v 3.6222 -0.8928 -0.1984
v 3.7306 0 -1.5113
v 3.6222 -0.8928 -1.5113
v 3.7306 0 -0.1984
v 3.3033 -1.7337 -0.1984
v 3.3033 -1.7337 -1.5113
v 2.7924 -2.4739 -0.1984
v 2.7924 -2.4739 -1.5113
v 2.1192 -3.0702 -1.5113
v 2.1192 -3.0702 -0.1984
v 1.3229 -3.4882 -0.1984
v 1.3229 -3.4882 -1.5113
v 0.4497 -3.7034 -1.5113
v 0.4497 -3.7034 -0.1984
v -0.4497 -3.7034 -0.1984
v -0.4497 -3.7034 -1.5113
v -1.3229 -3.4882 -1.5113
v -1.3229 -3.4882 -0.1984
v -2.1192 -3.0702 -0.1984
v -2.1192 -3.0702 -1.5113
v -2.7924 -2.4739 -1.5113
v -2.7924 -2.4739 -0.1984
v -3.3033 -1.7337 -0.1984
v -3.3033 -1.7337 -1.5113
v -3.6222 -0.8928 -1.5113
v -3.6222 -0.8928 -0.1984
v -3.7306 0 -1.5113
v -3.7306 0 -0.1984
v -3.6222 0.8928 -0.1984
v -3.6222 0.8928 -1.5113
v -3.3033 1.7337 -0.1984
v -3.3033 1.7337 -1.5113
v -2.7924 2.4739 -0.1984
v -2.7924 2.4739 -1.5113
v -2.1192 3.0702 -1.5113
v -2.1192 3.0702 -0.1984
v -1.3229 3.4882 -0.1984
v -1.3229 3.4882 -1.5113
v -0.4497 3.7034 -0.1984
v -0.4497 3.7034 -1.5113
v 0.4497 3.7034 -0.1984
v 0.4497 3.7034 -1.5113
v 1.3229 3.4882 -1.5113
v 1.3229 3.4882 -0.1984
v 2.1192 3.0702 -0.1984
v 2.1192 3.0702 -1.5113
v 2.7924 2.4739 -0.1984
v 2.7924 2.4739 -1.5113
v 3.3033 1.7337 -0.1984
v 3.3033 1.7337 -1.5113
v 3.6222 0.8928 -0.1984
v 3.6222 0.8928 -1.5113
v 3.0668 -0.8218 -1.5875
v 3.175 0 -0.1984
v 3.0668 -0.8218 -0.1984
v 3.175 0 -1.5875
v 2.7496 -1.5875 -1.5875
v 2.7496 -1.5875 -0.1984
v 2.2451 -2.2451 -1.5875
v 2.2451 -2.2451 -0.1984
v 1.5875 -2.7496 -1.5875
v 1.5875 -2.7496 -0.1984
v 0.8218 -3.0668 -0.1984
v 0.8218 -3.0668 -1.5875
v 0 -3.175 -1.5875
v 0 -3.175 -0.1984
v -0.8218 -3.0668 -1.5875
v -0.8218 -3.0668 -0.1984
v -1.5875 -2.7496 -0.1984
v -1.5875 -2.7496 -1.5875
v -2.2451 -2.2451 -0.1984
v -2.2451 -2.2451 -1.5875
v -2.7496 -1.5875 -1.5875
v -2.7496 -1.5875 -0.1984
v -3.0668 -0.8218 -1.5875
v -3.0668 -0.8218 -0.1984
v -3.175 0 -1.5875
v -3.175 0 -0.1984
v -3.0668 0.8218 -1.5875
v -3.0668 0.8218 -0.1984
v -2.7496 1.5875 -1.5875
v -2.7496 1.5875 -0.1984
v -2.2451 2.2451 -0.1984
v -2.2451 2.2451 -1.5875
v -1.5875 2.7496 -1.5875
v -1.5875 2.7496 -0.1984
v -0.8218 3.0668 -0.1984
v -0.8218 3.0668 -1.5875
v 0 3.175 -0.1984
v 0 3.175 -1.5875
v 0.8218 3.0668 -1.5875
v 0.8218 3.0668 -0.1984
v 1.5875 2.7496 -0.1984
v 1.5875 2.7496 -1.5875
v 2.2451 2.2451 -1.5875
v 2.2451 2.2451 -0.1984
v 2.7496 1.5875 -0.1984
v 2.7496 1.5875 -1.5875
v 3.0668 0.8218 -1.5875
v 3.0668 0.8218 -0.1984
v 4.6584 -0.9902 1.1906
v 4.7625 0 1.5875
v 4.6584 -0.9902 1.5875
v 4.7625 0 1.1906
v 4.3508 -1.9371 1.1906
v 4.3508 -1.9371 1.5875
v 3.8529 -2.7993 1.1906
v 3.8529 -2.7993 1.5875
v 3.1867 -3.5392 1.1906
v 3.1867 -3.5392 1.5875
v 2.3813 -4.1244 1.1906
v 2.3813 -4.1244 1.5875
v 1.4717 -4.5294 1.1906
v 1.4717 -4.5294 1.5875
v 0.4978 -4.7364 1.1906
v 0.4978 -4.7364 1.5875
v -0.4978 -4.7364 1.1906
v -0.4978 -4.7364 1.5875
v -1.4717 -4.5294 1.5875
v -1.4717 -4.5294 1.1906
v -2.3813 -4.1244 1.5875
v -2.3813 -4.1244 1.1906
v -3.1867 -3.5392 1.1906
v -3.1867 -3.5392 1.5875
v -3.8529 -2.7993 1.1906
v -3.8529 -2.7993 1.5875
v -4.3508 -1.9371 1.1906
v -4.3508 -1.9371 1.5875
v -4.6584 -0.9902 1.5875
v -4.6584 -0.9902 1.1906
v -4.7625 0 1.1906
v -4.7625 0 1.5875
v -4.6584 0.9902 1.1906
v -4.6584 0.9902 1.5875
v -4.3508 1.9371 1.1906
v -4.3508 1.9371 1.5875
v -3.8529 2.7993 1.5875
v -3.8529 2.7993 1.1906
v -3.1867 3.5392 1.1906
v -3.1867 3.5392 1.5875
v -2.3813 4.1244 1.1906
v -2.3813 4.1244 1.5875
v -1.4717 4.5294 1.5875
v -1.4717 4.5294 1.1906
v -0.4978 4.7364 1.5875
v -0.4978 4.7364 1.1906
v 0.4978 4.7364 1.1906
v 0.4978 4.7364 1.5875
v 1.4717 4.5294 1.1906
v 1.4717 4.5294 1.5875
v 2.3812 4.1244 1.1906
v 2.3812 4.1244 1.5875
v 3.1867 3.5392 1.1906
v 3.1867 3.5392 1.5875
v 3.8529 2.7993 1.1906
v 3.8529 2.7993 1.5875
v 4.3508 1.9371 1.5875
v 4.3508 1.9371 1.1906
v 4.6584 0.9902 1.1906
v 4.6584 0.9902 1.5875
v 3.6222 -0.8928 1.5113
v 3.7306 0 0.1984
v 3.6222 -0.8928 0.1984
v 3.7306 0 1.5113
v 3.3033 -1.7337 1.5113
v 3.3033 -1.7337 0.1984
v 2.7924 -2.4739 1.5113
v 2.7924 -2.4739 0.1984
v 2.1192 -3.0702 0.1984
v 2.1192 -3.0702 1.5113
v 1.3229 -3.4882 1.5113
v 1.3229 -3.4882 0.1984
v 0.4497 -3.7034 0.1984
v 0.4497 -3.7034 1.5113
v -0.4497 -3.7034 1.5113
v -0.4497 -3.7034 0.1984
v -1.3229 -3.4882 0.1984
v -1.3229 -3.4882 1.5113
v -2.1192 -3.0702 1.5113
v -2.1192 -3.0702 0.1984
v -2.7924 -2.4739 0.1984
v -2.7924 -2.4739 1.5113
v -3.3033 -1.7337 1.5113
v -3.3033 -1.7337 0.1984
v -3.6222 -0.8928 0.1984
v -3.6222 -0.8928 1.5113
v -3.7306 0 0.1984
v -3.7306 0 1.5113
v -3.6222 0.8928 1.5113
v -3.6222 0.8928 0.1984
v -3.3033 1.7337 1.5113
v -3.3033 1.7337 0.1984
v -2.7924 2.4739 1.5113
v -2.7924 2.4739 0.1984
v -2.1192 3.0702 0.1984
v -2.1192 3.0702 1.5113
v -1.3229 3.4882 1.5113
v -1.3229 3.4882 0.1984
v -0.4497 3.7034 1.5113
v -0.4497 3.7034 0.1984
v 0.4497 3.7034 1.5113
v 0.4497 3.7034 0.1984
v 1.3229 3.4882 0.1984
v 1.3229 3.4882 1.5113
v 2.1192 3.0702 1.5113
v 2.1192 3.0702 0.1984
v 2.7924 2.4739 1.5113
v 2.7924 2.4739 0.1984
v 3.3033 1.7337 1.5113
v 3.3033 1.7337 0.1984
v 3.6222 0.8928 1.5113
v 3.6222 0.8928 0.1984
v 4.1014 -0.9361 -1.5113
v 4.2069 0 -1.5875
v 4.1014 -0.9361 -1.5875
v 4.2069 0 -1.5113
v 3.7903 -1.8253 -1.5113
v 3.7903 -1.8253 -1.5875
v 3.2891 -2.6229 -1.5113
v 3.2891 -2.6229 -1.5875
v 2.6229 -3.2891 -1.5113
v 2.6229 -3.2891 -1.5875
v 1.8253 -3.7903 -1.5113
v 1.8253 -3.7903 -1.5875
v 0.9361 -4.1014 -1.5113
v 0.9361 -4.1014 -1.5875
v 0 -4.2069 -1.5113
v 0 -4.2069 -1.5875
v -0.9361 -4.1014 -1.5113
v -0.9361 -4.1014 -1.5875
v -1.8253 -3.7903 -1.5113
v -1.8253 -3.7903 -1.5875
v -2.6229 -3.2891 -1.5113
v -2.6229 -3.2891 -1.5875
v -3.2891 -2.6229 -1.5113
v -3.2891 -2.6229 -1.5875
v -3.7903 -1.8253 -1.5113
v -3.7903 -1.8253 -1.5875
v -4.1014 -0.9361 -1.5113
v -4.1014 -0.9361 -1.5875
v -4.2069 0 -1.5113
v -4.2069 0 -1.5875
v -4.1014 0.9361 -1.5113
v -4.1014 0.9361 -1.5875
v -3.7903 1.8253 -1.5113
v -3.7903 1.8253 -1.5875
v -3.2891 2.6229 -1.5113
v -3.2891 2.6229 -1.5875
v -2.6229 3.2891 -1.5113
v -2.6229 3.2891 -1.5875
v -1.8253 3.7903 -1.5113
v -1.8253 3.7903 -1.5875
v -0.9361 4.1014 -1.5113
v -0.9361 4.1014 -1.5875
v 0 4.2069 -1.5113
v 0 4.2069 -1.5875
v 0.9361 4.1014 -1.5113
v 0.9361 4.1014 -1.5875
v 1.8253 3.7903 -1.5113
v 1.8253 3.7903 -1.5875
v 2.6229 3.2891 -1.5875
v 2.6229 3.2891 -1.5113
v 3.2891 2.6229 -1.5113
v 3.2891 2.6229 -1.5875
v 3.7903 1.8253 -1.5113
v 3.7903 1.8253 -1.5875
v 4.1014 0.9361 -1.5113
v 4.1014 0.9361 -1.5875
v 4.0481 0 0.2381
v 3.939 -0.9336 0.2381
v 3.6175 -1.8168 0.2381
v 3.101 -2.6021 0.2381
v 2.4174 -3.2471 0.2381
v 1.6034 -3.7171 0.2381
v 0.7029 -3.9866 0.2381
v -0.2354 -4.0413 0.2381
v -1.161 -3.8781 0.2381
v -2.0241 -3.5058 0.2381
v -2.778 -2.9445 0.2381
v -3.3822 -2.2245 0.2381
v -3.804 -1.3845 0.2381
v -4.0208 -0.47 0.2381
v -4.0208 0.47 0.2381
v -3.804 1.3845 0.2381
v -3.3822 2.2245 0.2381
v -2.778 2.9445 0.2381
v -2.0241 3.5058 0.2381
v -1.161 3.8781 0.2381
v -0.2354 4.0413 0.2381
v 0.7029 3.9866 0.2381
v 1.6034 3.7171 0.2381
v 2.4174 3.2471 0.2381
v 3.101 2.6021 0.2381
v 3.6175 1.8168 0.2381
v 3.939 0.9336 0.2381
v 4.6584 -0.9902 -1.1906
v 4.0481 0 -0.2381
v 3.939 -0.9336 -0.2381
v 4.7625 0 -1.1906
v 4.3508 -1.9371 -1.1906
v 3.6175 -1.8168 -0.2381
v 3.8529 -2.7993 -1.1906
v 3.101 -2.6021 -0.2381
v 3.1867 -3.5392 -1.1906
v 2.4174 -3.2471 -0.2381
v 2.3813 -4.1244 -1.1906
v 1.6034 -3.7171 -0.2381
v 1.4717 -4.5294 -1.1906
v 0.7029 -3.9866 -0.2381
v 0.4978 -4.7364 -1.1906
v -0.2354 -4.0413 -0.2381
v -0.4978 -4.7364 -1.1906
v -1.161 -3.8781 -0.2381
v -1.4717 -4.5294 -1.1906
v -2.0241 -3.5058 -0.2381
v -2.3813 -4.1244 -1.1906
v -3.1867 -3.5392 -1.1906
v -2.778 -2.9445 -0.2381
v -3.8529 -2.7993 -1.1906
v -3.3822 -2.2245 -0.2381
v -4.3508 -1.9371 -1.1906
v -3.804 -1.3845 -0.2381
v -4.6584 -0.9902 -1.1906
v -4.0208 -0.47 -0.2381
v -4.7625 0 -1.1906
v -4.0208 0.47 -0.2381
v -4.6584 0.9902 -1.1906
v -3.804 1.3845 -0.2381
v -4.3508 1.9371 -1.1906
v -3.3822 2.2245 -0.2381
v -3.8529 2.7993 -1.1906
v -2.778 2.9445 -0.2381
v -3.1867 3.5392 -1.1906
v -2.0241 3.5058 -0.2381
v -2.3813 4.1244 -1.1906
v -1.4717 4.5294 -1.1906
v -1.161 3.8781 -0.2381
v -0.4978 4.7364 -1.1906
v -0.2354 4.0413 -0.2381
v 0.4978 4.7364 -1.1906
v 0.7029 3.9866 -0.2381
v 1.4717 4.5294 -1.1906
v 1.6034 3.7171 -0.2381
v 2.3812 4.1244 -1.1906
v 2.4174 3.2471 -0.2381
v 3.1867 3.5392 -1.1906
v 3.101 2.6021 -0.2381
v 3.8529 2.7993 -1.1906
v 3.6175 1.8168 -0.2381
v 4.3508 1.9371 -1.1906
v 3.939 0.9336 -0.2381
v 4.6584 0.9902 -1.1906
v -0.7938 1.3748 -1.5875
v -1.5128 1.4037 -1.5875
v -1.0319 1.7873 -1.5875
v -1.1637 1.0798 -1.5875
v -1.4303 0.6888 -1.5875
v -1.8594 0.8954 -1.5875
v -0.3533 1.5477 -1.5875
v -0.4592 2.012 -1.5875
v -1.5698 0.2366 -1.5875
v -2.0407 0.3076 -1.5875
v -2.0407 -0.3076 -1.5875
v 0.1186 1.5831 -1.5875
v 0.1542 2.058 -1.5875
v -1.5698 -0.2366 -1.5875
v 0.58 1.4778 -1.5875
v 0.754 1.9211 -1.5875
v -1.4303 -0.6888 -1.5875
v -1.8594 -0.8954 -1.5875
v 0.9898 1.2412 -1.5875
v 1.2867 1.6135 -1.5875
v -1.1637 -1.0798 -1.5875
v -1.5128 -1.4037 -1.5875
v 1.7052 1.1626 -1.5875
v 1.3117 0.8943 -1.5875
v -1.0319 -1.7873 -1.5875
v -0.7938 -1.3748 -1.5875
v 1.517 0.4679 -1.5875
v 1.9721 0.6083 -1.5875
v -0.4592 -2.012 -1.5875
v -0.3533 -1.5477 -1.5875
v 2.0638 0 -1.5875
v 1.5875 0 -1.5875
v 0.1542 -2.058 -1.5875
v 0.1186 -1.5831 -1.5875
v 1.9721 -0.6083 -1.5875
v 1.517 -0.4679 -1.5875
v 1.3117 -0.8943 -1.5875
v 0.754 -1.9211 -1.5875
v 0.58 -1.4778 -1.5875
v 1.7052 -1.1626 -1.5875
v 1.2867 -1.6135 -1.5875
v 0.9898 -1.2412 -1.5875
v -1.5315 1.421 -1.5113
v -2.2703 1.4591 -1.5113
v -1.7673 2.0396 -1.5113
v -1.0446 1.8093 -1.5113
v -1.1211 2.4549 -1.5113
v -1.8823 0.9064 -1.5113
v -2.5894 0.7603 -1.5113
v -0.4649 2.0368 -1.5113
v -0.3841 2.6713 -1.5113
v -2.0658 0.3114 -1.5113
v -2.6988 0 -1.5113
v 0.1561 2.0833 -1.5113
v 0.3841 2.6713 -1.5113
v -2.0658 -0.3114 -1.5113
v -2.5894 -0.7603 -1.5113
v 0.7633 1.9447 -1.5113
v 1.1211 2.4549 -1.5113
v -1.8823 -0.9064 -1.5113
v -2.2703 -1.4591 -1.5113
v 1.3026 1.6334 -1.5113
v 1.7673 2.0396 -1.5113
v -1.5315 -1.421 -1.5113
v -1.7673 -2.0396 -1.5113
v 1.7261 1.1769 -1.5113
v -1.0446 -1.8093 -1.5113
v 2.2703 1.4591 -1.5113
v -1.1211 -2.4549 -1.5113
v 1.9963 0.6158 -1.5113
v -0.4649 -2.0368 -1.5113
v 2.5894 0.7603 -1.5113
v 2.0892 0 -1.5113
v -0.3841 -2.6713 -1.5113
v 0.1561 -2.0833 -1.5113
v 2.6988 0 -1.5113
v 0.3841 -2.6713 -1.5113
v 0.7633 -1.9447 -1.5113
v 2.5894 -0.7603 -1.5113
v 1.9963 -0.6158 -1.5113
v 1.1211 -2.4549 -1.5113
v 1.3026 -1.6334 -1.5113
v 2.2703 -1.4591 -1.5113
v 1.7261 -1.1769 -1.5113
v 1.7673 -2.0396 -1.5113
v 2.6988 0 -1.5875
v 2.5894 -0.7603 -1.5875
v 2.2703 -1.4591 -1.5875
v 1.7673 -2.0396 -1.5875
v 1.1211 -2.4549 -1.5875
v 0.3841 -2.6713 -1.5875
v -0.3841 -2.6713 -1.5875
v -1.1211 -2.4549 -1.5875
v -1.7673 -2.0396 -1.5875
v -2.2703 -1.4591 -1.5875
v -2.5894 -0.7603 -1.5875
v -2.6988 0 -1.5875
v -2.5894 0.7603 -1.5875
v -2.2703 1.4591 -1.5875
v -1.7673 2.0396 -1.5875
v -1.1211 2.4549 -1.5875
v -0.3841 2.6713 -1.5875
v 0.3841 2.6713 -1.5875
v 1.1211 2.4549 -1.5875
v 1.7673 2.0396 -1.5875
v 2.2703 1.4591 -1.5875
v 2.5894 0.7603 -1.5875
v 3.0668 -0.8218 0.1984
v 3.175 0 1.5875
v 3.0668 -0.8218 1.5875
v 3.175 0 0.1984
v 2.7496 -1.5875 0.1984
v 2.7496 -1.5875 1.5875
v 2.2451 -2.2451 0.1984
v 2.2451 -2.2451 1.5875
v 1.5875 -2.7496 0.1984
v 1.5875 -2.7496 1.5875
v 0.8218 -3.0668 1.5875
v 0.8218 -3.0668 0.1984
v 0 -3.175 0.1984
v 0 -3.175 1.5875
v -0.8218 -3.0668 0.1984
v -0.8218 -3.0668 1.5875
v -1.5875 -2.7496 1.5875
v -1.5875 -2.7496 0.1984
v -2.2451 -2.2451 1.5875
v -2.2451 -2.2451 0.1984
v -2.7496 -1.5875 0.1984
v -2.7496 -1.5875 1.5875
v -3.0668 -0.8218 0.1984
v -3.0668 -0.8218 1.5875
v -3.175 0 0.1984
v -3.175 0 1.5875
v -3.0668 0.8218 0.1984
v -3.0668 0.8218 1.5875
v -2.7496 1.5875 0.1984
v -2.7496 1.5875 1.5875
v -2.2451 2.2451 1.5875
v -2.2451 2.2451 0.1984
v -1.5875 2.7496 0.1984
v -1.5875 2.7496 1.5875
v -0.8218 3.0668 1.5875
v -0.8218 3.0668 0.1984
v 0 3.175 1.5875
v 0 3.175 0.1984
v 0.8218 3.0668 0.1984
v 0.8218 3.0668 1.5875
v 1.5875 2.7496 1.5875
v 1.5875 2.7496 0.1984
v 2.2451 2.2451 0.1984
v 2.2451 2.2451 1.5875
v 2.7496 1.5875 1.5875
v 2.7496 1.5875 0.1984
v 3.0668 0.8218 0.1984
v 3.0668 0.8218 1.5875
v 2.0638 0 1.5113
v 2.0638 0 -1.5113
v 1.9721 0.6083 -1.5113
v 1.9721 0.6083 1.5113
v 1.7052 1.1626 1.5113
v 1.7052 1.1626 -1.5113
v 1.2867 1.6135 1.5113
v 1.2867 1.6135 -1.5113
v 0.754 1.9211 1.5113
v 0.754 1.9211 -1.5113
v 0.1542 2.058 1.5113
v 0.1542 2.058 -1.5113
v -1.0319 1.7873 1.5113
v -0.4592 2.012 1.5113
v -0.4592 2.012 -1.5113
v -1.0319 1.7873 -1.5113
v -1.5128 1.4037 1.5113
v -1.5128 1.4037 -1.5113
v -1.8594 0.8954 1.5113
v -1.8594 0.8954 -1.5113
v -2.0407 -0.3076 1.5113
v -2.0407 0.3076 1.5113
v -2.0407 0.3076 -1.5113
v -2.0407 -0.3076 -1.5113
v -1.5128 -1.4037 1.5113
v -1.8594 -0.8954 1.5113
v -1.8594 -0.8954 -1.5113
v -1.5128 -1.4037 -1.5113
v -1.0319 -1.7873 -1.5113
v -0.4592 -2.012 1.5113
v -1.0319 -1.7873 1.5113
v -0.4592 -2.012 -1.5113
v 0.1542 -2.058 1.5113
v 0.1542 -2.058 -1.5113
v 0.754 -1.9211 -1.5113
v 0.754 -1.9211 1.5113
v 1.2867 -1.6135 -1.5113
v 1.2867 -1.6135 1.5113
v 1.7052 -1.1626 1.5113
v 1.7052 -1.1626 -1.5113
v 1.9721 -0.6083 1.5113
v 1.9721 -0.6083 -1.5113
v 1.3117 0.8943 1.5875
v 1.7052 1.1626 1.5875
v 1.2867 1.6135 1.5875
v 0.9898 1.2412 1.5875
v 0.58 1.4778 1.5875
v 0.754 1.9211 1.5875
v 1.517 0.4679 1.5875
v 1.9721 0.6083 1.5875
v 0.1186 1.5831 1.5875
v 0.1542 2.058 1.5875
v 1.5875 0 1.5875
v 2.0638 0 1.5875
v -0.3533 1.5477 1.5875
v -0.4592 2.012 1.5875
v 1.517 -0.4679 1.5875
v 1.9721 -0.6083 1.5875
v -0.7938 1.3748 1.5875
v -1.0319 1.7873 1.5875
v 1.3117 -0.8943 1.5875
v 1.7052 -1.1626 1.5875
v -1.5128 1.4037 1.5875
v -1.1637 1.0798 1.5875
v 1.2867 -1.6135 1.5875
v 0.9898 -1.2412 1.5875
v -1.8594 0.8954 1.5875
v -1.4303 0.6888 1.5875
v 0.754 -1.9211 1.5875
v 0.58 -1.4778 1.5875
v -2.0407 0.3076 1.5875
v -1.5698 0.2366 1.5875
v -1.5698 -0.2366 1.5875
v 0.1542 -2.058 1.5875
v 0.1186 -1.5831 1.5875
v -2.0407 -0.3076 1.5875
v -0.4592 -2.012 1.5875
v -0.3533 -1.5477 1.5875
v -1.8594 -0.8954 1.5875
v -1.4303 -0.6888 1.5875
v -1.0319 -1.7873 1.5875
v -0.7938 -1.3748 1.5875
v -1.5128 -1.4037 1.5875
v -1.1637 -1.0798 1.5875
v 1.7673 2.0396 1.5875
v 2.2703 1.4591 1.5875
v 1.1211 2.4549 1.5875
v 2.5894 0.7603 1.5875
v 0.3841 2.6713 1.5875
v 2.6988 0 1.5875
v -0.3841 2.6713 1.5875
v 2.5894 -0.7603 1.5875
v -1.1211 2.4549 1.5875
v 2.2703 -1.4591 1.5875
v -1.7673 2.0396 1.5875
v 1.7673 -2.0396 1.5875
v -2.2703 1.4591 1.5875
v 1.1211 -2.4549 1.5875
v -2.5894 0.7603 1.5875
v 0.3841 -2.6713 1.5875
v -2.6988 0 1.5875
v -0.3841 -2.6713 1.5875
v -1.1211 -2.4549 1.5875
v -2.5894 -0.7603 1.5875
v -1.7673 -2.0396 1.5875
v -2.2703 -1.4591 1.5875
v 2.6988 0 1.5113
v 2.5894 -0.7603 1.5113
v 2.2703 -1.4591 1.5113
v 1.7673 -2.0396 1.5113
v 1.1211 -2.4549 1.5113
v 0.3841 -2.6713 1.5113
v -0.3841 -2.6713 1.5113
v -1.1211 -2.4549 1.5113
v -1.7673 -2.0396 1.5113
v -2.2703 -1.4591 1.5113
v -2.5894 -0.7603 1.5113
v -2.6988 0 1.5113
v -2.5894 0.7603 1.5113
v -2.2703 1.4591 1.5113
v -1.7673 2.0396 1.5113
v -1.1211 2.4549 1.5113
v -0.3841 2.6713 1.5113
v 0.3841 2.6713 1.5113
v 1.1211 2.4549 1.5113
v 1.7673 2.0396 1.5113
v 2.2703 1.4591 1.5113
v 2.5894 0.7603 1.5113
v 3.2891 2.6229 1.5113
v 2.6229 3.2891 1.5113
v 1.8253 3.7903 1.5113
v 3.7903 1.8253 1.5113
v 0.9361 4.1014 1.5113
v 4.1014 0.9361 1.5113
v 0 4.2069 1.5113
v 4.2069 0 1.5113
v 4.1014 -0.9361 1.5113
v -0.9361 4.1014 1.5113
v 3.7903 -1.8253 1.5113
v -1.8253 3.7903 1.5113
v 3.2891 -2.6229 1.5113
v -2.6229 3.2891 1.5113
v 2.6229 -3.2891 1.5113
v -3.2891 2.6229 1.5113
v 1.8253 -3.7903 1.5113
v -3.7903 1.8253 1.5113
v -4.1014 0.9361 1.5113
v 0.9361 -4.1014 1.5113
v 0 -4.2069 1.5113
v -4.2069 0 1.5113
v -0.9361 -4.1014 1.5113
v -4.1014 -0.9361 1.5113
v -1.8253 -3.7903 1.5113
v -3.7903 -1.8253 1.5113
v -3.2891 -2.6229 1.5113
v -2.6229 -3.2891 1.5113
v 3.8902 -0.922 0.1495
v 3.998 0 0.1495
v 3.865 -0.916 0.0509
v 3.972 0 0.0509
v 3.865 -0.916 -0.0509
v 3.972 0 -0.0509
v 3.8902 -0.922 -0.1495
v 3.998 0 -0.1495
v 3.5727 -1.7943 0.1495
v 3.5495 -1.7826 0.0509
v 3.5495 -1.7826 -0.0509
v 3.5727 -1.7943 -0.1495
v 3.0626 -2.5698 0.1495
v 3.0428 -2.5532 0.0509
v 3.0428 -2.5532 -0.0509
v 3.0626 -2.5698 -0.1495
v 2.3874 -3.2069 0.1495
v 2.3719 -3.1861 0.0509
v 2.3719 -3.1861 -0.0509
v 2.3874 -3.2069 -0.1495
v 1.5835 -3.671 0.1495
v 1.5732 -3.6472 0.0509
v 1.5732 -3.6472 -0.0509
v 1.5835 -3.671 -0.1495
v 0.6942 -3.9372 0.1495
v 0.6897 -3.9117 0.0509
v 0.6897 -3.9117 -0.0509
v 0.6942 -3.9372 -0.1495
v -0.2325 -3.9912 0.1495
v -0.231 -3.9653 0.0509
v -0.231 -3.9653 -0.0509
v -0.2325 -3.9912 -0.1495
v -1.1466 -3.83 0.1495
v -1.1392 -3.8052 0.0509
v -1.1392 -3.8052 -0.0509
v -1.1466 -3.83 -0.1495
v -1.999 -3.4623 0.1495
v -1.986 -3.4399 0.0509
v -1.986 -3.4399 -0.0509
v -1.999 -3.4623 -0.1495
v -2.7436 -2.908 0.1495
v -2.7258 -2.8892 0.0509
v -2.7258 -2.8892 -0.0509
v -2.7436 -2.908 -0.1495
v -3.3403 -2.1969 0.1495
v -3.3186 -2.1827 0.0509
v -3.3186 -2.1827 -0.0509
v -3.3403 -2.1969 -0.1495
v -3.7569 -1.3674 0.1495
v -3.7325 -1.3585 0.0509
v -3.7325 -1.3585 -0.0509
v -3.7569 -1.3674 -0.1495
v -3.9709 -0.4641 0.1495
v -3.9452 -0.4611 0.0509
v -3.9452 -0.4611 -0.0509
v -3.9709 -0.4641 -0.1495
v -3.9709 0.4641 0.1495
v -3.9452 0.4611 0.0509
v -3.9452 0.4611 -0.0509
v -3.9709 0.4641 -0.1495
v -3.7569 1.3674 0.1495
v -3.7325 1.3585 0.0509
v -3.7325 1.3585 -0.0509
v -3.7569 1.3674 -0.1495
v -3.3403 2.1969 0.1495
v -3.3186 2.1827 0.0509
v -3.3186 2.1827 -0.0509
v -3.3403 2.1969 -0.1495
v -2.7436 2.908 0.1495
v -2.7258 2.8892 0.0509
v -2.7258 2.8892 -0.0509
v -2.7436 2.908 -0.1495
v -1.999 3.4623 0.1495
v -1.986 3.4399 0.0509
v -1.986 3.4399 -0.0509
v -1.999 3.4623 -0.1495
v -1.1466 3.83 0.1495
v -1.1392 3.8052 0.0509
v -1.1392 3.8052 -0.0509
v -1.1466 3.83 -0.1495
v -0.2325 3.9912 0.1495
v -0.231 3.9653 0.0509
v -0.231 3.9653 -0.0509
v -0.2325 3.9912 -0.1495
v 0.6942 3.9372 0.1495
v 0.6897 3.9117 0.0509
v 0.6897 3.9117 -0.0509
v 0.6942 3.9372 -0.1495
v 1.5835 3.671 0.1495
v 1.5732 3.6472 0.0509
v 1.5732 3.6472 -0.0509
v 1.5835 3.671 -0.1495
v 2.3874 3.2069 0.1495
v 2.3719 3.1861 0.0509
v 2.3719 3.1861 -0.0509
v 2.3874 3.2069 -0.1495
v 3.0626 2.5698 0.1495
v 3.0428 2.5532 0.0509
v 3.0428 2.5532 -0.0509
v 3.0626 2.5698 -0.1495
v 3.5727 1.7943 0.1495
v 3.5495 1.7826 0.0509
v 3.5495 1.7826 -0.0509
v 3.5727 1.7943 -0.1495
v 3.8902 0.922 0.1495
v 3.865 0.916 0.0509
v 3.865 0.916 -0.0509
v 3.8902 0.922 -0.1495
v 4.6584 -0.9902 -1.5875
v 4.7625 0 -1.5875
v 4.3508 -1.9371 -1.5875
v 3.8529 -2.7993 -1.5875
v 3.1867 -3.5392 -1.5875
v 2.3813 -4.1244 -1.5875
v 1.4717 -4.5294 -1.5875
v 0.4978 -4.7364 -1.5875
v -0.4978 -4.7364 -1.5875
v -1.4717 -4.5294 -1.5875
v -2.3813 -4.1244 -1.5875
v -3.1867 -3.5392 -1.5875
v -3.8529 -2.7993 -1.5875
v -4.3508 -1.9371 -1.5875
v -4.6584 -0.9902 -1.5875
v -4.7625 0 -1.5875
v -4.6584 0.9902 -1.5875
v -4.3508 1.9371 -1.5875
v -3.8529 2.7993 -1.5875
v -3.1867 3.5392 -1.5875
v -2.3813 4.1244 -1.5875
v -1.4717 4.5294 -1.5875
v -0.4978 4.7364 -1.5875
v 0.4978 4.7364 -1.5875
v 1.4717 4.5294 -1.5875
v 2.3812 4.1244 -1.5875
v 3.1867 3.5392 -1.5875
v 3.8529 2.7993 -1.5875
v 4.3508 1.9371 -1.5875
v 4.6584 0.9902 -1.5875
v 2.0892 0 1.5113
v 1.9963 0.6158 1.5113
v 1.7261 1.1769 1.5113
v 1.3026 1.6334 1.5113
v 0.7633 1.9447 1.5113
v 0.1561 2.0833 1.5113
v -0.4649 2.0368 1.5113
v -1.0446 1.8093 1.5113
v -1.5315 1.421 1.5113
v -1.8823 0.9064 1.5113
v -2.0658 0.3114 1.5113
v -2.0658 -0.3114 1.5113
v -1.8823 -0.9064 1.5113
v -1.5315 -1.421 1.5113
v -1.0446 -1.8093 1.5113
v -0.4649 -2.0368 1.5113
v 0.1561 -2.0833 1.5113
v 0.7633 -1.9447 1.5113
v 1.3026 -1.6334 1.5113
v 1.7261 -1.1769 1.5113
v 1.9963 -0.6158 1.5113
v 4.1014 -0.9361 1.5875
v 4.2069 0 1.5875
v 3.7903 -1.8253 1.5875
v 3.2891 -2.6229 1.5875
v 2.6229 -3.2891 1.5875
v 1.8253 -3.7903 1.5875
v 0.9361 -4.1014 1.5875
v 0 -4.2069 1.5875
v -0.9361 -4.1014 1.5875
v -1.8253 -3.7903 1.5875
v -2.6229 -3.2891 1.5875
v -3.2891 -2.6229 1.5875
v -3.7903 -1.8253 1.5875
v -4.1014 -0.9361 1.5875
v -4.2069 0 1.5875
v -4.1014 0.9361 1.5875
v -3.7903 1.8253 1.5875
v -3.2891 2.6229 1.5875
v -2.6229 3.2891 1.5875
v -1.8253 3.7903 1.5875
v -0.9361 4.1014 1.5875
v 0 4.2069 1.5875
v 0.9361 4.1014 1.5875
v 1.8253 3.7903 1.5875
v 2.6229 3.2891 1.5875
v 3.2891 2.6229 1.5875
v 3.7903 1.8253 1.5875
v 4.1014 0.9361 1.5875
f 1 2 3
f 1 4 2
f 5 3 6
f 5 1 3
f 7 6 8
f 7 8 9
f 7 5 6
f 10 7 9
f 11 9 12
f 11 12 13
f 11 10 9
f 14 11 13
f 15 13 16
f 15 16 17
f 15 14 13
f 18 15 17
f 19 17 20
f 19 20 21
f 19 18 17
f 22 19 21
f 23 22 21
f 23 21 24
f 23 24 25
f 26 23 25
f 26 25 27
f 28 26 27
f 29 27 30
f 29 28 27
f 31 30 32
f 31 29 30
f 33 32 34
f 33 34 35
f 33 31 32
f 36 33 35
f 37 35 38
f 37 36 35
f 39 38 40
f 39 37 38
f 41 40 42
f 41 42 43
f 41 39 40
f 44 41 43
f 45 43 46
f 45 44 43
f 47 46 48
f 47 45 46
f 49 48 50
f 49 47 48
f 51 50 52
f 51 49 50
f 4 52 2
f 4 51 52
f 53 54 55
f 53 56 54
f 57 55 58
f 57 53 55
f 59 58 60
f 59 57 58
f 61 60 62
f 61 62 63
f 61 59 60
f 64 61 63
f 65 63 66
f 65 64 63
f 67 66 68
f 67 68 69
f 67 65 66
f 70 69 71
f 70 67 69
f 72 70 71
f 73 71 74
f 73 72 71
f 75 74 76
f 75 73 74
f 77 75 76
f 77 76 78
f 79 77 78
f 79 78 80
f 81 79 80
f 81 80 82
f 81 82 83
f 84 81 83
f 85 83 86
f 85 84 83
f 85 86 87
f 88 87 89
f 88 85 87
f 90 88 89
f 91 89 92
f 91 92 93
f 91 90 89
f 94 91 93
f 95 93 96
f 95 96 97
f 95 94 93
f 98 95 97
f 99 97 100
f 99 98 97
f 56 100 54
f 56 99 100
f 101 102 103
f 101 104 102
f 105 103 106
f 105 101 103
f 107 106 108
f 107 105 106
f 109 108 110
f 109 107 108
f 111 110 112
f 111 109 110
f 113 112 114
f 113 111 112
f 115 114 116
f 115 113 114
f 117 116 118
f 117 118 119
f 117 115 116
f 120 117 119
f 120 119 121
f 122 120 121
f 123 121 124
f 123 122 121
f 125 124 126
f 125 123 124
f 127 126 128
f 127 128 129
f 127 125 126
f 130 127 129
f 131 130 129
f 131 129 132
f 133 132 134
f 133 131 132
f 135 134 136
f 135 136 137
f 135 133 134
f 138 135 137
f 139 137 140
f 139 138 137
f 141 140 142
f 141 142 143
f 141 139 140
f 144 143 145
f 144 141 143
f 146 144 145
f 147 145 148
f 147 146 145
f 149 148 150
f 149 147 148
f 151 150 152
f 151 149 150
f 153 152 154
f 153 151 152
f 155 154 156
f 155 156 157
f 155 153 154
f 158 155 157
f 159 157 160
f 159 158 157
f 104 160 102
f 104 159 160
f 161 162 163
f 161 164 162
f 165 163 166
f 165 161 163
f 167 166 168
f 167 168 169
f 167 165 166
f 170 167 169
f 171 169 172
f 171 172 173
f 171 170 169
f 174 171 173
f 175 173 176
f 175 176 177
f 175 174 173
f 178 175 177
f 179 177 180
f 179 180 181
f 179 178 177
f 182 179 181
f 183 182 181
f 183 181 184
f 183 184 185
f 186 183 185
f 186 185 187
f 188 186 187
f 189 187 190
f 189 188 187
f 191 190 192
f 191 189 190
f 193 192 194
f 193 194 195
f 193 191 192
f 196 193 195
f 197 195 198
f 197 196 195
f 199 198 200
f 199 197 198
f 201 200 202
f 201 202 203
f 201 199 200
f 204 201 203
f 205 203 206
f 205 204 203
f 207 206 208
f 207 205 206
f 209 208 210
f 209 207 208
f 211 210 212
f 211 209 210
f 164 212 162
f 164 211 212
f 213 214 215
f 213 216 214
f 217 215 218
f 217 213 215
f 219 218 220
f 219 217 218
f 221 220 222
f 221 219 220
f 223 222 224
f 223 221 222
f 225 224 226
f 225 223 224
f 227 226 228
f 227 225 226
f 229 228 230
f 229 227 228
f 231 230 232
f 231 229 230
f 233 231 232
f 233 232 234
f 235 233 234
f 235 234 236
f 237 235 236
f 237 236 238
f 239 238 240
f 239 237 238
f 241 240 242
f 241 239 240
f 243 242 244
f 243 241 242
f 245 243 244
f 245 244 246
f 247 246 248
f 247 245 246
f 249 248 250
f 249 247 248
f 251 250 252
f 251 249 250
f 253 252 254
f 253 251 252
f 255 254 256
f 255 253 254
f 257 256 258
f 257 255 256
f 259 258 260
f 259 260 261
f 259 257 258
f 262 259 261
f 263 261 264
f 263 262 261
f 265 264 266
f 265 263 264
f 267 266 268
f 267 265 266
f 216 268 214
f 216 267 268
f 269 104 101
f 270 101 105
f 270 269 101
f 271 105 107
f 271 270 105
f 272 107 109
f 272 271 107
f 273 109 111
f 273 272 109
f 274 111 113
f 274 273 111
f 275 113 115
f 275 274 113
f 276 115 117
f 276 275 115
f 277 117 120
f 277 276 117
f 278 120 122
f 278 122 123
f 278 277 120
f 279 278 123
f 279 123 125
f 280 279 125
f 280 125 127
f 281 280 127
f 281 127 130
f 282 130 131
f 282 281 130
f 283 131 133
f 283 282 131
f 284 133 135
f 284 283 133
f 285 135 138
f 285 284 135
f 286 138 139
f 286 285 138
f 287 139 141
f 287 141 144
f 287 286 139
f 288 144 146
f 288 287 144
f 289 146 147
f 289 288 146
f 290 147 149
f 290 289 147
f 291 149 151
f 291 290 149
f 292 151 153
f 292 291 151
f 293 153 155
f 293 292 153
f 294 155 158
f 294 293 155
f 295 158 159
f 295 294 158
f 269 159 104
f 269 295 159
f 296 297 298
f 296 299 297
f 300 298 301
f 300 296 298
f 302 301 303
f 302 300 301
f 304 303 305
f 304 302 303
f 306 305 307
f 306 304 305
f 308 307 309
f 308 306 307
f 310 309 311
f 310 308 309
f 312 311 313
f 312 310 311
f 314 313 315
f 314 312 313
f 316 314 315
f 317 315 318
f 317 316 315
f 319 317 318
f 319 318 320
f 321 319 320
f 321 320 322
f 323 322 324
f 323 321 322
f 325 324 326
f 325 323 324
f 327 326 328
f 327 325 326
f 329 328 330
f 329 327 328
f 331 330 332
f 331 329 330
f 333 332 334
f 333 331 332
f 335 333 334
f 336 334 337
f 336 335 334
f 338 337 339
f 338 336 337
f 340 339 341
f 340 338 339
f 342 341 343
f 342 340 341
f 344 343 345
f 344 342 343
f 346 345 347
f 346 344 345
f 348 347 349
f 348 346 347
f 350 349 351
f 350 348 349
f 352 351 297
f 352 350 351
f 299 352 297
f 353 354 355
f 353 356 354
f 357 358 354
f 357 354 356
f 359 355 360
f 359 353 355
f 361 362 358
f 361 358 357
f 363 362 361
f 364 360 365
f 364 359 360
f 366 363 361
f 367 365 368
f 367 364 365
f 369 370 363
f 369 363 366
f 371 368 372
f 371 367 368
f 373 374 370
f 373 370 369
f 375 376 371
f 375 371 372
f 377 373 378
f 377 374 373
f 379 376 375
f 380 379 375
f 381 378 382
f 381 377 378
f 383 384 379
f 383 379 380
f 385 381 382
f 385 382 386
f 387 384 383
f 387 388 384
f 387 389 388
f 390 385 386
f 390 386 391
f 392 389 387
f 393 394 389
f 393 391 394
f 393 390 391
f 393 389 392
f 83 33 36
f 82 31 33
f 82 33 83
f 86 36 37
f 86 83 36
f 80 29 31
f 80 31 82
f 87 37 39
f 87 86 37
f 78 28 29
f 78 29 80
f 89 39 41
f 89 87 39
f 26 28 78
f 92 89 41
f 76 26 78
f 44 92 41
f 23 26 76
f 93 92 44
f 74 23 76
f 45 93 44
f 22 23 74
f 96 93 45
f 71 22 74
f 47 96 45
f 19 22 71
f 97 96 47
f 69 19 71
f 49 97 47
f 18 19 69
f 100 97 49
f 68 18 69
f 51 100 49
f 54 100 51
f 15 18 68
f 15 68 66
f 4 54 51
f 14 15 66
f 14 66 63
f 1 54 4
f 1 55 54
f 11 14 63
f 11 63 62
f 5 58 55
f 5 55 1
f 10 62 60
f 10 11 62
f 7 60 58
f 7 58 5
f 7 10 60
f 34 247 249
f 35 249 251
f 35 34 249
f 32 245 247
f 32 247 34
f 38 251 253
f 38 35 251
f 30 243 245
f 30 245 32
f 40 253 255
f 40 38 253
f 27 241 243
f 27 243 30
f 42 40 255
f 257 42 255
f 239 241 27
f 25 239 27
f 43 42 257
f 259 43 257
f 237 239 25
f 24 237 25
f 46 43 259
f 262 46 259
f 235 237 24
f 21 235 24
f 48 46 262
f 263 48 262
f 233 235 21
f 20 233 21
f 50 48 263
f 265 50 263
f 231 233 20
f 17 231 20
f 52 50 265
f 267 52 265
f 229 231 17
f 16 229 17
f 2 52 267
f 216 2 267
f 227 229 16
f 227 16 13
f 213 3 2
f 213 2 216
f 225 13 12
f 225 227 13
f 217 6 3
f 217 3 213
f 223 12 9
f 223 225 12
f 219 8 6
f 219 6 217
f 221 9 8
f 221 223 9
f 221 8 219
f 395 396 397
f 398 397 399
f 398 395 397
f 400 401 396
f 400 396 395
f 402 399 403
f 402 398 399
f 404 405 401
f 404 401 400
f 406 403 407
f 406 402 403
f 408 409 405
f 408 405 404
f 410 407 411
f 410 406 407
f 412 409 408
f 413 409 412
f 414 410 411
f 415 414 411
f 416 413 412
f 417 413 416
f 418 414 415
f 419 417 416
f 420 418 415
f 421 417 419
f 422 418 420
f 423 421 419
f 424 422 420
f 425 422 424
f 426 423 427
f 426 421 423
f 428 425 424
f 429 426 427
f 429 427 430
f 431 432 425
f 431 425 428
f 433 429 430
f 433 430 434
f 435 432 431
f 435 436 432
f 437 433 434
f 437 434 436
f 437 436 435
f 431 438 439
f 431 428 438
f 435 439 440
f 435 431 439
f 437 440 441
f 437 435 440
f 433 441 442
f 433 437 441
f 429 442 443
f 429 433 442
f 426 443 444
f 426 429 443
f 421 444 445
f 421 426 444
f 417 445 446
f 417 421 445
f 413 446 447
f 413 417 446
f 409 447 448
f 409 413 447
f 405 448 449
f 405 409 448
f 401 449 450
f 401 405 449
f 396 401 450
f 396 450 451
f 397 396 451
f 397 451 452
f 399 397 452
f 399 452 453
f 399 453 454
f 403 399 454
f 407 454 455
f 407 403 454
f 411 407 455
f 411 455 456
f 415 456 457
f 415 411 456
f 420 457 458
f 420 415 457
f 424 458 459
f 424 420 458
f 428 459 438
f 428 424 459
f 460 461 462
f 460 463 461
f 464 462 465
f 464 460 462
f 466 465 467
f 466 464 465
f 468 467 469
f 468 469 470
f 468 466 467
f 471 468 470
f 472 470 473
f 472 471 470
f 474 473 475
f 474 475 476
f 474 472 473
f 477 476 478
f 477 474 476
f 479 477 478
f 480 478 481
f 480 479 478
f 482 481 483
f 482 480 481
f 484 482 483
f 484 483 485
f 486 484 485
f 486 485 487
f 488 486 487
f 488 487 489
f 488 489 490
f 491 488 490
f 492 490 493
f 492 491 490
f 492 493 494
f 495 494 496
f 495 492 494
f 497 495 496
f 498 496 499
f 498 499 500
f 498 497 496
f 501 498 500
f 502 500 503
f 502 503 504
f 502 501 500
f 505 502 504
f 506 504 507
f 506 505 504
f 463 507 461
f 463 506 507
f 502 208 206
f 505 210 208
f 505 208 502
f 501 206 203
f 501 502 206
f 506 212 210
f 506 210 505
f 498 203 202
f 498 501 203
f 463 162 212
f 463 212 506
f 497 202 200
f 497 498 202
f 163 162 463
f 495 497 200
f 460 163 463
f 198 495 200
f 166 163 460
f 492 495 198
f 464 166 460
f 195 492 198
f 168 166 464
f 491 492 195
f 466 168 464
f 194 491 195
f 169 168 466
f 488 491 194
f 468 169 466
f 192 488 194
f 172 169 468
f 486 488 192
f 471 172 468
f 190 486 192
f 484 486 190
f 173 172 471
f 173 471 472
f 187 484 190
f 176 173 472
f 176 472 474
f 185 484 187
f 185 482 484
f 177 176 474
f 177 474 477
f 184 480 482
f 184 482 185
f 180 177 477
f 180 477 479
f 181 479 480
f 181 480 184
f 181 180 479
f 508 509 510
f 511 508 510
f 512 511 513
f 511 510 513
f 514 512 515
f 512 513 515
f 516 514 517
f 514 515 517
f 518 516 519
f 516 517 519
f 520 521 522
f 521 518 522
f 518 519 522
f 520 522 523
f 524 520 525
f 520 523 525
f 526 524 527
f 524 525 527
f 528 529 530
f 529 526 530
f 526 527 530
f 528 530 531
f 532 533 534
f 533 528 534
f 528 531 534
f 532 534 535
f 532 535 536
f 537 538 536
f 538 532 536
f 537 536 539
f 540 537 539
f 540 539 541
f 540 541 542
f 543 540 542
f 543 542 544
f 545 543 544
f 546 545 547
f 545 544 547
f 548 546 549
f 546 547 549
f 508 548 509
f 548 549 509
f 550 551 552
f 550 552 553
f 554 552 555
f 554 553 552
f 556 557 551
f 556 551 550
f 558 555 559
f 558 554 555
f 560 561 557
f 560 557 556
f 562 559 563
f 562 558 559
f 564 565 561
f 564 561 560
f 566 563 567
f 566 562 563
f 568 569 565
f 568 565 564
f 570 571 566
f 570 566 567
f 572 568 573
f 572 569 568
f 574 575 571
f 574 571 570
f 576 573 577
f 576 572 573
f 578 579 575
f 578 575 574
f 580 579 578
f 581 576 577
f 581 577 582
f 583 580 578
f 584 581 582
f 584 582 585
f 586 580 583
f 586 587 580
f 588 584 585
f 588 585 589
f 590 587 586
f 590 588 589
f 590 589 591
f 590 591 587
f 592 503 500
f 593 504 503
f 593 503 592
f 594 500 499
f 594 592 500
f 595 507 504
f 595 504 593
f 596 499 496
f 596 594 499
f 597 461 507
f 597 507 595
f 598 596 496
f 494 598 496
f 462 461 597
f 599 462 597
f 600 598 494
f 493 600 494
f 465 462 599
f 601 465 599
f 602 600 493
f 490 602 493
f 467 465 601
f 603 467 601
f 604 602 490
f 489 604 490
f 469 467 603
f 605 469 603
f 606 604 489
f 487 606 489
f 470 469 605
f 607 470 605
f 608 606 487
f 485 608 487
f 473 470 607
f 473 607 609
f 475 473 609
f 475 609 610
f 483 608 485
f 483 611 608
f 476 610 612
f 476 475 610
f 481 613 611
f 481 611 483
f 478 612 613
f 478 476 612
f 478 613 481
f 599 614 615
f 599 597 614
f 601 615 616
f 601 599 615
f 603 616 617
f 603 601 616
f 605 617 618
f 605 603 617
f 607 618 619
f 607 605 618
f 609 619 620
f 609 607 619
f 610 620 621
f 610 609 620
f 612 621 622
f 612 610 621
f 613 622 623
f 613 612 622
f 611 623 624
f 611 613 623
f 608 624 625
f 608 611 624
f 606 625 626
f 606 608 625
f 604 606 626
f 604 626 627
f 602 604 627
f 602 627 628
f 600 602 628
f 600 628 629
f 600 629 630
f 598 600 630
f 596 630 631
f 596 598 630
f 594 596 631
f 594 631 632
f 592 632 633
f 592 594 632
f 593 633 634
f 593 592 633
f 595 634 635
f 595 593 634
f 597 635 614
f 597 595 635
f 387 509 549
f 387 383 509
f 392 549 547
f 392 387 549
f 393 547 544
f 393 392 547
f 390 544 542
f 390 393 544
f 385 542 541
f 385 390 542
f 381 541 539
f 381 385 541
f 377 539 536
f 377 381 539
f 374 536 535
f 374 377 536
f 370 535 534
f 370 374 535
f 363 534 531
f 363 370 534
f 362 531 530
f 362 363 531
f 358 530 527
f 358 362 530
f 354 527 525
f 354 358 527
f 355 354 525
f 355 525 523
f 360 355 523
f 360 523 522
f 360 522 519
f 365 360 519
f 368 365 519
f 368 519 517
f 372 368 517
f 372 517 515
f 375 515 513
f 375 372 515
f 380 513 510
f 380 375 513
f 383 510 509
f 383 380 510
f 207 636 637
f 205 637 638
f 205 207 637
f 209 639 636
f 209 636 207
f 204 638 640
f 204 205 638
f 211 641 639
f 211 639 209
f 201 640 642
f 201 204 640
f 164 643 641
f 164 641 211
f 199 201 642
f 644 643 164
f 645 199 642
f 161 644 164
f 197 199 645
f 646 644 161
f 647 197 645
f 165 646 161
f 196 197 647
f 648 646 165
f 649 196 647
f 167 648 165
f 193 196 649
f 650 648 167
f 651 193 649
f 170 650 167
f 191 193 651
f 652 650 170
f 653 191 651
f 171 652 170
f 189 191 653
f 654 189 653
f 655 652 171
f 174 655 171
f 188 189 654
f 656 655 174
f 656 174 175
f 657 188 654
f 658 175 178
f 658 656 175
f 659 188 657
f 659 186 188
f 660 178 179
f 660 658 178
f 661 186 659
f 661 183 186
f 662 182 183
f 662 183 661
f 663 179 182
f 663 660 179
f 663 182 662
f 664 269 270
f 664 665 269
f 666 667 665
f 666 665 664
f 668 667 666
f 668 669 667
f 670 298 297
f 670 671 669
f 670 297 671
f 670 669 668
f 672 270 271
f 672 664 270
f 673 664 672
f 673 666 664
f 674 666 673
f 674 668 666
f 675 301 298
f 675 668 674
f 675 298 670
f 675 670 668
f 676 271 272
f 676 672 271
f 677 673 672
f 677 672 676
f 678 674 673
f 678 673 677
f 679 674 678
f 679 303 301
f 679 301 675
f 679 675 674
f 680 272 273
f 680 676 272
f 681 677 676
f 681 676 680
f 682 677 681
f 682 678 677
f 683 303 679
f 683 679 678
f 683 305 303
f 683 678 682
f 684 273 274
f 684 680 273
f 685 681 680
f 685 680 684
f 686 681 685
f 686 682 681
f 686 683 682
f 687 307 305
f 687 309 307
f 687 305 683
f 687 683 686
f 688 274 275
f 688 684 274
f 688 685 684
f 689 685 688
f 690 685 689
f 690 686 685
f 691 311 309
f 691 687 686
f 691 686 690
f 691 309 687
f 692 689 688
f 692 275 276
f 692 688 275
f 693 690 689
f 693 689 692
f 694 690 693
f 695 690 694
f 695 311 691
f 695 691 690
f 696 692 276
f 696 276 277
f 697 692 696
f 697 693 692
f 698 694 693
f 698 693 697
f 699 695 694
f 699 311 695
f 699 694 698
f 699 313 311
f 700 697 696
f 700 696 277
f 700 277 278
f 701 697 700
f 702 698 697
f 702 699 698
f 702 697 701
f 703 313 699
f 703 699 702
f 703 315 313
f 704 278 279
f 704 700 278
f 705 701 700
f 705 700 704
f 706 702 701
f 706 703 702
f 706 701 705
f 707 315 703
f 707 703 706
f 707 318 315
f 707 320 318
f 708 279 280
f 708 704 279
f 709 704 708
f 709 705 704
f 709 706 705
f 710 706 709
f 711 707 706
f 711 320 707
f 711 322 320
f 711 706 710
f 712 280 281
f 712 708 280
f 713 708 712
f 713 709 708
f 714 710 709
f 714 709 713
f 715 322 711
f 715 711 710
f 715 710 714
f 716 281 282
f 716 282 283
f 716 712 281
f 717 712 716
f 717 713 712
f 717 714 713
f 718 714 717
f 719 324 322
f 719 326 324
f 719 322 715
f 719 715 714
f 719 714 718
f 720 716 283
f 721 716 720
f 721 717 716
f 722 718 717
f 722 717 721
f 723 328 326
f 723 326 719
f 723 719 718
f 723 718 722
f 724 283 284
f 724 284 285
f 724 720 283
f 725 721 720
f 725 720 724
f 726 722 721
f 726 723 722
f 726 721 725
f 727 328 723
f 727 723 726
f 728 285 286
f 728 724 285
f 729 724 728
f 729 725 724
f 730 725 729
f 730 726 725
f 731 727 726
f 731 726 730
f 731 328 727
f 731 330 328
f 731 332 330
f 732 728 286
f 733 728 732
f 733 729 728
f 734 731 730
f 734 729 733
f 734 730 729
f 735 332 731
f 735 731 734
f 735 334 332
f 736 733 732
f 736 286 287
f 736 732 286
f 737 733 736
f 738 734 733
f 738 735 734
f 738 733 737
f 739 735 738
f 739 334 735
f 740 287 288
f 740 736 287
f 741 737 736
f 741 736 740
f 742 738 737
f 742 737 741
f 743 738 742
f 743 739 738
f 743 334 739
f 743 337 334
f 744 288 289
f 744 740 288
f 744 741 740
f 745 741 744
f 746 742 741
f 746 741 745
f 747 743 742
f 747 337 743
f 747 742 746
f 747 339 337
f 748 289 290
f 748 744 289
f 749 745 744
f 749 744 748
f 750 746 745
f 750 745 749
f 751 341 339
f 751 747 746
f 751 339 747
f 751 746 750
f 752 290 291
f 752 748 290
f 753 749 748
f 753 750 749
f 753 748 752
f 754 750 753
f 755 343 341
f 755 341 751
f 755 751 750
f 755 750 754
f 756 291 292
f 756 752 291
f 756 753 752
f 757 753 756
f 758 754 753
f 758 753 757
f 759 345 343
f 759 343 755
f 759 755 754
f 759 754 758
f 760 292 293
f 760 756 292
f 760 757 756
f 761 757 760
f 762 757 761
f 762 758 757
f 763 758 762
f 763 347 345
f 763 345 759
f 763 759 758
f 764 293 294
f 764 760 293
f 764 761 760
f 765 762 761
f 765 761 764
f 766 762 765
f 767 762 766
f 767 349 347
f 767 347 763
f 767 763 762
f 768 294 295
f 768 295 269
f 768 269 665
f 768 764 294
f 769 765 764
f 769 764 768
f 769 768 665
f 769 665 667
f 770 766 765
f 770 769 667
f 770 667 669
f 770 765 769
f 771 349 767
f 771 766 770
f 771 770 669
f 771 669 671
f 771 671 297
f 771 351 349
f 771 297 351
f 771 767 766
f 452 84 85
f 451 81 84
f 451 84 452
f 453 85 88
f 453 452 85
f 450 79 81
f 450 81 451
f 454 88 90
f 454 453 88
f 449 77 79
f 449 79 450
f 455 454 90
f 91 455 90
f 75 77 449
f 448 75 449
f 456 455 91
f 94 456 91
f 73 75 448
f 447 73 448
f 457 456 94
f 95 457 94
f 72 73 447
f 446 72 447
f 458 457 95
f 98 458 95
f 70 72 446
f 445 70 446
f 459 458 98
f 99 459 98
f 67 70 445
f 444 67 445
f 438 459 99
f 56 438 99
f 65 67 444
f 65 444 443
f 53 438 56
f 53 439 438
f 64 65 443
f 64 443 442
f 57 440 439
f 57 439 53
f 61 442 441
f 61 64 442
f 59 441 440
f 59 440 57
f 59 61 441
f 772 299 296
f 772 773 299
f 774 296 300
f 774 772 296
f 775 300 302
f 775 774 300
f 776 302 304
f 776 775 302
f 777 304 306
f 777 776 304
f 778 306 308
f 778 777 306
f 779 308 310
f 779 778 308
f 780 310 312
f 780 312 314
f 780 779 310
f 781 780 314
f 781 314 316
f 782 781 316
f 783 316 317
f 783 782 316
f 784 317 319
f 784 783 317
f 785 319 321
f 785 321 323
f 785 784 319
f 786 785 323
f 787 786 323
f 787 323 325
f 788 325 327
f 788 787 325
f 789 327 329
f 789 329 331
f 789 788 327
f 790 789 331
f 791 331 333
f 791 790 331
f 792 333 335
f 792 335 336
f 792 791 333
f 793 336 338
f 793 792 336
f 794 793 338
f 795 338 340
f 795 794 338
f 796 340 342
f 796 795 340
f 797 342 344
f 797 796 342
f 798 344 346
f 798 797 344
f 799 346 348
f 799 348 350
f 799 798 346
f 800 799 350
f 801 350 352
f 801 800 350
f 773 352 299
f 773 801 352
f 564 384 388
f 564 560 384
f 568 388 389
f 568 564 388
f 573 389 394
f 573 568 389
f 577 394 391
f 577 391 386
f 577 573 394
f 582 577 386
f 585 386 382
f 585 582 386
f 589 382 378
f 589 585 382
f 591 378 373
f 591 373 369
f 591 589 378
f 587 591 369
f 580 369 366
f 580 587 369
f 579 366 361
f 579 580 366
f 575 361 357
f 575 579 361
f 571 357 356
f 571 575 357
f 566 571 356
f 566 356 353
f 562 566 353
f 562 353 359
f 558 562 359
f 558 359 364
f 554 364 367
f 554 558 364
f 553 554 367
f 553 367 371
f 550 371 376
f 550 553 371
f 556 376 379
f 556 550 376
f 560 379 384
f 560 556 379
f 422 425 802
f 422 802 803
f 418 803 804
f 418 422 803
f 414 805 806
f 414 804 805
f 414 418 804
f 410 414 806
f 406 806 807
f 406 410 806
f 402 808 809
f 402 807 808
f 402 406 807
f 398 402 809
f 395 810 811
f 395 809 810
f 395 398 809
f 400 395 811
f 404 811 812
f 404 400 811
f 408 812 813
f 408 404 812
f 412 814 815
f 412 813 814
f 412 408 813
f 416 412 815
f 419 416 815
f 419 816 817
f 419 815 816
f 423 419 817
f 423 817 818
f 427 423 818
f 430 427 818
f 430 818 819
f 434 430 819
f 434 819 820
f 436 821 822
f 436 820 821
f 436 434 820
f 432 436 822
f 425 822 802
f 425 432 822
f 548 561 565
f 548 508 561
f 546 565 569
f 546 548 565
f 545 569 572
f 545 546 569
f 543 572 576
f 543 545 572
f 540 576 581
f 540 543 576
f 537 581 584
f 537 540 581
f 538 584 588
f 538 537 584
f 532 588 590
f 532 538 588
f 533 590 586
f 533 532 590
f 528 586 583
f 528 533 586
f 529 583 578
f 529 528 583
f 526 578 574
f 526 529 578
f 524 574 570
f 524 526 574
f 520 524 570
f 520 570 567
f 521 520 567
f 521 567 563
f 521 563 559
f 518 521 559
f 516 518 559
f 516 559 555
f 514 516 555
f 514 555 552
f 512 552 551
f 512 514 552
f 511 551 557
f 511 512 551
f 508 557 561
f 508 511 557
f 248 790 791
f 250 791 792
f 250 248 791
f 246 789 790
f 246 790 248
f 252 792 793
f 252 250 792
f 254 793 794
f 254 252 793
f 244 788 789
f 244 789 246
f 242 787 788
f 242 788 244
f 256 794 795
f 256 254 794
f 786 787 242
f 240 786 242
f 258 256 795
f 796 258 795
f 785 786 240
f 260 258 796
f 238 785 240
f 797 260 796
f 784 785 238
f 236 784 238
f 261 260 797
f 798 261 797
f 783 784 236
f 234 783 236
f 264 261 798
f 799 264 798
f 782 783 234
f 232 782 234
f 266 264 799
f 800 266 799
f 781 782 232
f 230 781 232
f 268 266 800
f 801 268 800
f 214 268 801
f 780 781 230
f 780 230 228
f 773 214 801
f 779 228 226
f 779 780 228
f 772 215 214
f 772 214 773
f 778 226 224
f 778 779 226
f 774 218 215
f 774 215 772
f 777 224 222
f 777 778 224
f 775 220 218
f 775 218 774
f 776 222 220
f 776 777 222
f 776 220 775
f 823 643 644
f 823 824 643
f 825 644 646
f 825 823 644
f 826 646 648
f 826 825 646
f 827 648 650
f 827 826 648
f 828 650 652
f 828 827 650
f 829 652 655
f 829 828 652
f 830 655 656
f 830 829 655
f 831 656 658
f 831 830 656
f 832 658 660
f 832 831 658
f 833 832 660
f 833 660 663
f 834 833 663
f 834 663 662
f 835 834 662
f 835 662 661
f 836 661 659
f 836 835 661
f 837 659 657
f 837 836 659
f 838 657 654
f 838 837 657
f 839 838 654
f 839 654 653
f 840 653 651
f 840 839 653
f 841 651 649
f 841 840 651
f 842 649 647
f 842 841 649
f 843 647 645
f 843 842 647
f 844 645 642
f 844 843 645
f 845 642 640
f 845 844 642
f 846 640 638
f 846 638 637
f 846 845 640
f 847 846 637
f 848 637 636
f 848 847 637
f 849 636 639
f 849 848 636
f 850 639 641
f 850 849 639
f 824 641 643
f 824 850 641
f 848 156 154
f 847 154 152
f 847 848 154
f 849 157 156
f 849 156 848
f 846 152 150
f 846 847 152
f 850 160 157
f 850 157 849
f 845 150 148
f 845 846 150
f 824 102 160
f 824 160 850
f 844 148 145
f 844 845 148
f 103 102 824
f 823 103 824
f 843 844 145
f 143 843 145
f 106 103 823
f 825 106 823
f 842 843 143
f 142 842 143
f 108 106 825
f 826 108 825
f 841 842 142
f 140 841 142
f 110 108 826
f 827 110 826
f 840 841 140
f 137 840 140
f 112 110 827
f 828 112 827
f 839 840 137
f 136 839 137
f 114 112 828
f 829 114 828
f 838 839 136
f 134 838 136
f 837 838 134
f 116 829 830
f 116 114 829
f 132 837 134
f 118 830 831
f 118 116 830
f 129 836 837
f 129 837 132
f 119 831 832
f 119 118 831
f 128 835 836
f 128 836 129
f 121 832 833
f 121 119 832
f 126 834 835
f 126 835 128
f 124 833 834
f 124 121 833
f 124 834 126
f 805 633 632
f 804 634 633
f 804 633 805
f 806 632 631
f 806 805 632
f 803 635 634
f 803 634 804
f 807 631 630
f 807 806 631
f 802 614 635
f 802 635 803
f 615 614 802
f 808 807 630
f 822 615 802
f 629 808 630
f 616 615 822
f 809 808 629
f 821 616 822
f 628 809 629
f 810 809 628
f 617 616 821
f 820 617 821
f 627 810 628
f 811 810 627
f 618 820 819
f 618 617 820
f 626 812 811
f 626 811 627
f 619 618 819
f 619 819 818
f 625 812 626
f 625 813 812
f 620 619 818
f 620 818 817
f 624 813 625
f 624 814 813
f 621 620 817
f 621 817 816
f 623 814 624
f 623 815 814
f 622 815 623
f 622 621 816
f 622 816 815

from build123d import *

# Parameters (mm, degrees)
CUT_EXTRUDE_THIN1_DEPTH      = 7.919752073
CUT_EXTRUDE_THIN1_DEPTH_BACK = 7.919752073
SKETCH2_R                    = 2.08915
SKETCH2_R_2                  = 2.06375


with BuildPart() as part:
    # Sketch1 → Revolve1 (revolve)
    with BuildSketch(Plane(origin=(0, 0, 0), x_dir=(0, 0, -1), z_dir=(1, 0, 0)), mode=Mode.PRIVATE) as revolve1_sk:
        with BuildLine():
            Line((1.190625, 4.7625), (1.5875, 4.7625))
            Line((1.5875, 4.7625), (1.5875, 4.206875))
            Line((1.5875, 4.206875), (1.5113, 4.206875))
            Line((1.5113, 4.206875), (1.5113, 3.730625))
            Line((1.5113, 3.730625), (0.1984375, 3.730625))
            Line((0.1984375, 3.730625), (0.1984375, 3.175))
            Line((0.1984375, 3.175), (1.5875, 3.175))
            Line((1.5875, 3.175), (1.5875, 2.69875))
            Line((1.5875, 2.69875), (1.5113, 2.69875))
            Line((1.5113, 2.69875), (1.5113, 2.06375))
            Line((1.5113, 2.06375), (1.5875, 2.06375))
            Line((1.5875, 2.06375), (1.5875, 1.5875))
            Line((1.5875, 1.5875), (-1.5875, 1.5875))
            Line((-1.5875, 1.5875), (-1.5875, 2.06375))
            Line((-1.5875, 2.06375), (-1.5113, 2.06375))
            Line((-1.5113, 2.06375), (-1.5113, 2.69875))
            Line((-1.5113, 2.69875), (-1.5875, 2.69875))
            Line((-1.5875, 2.69875), (-1.5875, 3.175))
            Line((-1.5875, 3.175), (-0.1984375, 3.175))
            Line((-0.1984375, 3.175), (-0.1984375, 3.730625))
            Line((-0.1984375, 3.730625), (-1.5113, 3.730625))
            Line((-1.5113, 3.730625), (-1.5113, 4.206875))
            Line((-1.5113, 4.206875), (-1.5875, 4.206875))
            Line((-1.5875, 4.206875), (-1.5875, 4.7625))
            Line((-1.5875, 4.7625), (-1.190625, 4.7625))
            Line((-1.190625, 4.7625), (-0.238125, 4.048125))
            ThreePointArc((-0.238125, 4.048125), (0, 3.96875), (0.238125, 4.048125))
            Line((0.238125, 4.048125), (1.190625, 4.7625))
        make_face()
    revolve(revolve1_sk.sketch.rotate(Axis((0, 0, 1.5875), (0, 0, -1)), 90), axis=Axis((0, 0, 1.5875), (0, 0, -1)))

    # Sketch2 → Cut-Extrude-Thin1 (cut, two sides: drawn at the far end of the back side and taken through both)
    with BuildSketch(Plane.XY.offset(-CUT_EXTRUDE_THIN1_DEPTH_BACK)):
        Circle(SKETCH2_R)
        Circle(SKETCH2_R_2, mode=Mode.SUBTRACT)
    extrude(amount=CUT_EXTRUDE_THIN1_DEPTH + CUT_EXTRUDE_THIN1_DEPTH_BACK, mode=Mode.SUBTRACT)


with BuildPart() as cut_extrude_thin1_piece_1:
    # of the separate pieces the step leaves, piece 1, a body of its own (cut_extrude_thin1_pieces)
    add(part.part.solids().sort_by_distance((4.048125, 0, 0.238125))[0])


with BuildPart() as cut_extrude_thin1_piece_2:
    # of the separate pieces the step leaves, piece 2, a body of its own (cut_extrude_thin1_pieces)
    add(part.part.solids().sort_by_distance((2.06375, 0, 1.5875))[0])


solid = Compound([cut_extrude_thin1_piece_1.part, cut_extrude_thin1_piece_2.part])
